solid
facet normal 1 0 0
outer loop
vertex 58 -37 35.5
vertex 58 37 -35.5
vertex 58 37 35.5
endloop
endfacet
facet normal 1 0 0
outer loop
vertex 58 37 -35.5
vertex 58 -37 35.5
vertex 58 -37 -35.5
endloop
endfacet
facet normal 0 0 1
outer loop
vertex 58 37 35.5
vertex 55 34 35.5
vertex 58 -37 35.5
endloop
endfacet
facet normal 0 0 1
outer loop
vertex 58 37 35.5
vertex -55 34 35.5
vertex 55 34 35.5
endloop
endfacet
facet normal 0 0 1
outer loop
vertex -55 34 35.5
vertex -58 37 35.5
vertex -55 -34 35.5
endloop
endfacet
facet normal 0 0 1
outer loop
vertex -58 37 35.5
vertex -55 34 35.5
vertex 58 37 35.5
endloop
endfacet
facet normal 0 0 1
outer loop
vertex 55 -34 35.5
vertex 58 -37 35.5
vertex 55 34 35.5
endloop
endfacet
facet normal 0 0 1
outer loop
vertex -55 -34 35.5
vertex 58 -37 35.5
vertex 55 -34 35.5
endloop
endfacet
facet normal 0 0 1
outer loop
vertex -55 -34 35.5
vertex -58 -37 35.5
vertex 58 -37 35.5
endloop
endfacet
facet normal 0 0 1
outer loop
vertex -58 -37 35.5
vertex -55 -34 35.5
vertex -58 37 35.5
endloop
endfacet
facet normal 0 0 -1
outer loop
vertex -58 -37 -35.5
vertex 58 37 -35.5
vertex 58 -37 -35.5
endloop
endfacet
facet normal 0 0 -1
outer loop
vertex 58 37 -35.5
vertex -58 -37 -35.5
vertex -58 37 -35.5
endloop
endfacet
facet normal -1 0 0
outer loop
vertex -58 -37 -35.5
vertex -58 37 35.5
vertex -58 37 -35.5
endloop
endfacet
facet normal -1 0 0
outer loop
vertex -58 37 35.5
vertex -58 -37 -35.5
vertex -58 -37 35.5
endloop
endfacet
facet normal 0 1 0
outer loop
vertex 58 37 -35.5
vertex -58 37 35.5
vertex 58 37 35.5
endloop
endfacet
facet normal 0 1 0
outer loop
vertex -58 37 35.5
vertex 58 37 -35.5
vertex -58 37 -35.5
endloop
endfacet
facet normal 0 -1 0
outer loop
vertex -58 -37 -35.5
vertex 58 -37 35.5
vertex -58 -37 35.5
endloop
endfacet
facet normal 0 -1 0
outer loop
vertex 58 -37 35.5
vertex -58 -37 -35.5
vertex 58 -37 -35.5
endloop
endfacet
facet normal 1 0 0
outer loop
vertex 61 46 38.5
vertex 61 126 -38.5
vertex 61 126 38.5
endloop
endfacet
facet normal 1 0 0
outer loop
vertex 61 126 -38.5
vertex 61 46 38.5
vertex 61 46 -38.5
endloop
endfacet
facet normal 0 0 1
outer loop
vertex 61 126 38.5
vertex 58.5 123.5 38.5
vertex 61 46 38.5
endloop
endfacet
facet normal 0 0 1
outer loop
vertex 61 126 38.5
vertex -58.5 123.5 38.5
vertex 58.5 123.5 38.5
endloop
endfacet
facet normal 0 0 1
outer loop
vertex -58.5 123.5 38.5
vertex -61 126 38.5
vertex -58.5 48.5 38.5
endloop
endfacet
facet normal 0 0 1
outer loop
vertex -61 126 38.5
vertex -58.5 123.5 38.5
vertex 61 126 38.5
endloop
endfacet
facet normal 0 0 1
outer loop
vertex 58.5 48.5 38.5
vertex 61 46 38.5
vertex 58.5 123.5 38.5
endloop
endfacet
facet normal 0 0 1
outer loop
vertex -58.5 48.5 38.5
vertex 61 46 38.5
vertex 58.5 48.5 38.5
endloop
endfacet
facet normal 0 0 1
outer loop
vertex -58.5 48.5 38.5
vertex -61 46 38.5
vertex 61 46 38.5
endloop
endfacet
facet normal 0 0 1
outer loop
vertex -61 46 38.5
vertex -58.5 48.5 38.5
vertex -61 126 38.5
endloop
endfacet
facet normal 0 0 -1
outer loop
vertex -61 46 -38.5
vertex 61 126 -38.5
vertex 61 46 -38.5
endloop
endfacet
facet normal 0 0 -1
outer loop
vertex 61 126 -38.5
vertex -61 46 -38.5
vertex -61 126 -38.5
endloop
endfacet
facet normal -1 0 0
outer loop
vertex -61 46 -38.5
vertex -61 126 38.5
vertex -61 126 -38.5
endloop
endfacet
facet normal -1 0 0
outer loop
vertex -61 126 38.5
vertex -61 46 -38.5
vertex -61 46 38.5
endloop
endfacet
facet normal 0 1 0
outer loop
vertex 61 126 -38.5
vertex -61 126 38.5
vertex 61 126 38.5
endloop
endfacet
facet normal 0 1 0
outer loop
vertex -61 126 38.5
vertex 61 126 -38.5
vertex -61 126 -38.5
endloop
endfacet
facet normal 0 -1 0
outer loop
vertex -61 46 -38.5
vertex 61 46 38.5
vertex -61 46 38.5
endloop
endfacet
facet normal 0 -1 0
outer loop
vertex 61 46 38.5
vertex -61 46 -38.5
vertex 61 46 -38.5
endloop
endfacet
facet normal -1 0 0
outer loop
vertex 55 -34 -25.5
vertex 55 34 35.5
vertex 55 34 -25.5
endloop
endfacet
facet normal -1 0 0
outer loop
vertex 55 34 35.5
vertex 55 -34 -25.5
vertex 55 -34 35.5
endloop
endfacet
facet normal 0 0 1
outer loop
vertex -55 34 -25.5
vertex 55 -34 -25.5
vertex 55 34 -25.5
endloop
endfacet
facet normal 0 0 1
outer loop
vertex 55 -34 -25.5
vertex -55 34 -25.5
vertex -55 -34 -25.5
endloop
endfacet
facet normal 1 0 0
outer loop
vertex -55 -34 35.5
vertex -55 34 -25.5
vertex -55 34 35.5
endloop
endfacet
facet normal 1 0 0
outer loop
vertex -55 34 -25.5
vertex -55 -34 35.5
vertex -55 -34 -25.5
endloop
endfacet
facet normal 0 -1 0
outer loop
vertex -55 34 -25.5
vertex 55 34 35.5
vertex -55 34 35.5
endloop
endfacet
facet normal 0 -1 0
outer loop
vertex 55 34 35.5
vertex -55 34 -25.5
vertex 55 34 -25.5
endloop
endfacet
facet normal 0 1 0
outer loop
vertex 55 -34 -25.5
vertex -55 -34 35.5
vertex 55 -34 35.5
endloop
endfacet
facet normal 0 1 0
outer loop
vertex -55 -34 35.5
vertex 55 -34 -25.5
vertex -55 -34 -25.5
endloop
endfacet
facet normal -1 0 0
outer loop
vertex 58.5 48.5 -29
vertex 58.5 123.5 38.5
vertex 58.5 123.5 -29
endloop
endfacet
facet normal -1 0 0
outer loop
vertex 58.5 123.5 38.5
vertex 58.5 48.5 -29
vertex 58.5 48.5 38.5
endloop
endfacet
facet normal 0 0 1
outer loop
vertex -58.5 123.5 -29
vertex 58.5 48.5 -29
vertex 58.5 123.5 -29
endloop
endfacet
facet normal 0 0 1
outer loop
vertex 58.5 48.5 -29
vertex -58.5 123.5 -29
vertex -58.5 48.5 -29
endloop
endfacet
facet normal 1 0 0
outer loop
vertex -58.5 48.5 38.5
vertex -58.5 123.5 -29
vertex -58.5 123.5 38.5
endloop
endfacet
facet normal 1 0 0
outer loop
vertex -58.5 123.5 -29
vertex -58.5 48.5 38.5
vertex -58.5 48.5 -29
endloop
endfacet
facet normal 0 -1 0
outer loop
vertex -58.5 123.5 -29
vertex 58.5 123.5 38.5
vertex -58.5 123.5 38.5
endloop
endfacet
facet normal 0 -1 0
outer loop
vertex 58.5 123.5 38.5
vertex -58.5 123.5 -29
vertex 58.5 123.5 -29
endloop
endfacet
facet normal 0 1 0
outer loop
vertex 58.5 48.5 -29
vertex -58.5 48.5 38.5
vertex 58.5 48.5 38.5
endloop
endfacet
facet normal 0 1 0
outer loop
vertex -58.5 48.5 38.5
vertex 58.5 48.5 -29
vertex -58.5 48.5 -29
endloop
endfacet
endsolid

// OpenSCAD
//print in place customizable deck box

//How many cards?
c=110;



module box(){
    cube([c+6,74,71],true);
    translate([0,86,0]) cube([c+12,80,77],true);
}

module cut(){
    cube([c,68,65],true);
    translate([0,86,0]) cube([c+7,75,72],true);
}

difference() {
    box();
    translate([0,0,7]) cut();
}
